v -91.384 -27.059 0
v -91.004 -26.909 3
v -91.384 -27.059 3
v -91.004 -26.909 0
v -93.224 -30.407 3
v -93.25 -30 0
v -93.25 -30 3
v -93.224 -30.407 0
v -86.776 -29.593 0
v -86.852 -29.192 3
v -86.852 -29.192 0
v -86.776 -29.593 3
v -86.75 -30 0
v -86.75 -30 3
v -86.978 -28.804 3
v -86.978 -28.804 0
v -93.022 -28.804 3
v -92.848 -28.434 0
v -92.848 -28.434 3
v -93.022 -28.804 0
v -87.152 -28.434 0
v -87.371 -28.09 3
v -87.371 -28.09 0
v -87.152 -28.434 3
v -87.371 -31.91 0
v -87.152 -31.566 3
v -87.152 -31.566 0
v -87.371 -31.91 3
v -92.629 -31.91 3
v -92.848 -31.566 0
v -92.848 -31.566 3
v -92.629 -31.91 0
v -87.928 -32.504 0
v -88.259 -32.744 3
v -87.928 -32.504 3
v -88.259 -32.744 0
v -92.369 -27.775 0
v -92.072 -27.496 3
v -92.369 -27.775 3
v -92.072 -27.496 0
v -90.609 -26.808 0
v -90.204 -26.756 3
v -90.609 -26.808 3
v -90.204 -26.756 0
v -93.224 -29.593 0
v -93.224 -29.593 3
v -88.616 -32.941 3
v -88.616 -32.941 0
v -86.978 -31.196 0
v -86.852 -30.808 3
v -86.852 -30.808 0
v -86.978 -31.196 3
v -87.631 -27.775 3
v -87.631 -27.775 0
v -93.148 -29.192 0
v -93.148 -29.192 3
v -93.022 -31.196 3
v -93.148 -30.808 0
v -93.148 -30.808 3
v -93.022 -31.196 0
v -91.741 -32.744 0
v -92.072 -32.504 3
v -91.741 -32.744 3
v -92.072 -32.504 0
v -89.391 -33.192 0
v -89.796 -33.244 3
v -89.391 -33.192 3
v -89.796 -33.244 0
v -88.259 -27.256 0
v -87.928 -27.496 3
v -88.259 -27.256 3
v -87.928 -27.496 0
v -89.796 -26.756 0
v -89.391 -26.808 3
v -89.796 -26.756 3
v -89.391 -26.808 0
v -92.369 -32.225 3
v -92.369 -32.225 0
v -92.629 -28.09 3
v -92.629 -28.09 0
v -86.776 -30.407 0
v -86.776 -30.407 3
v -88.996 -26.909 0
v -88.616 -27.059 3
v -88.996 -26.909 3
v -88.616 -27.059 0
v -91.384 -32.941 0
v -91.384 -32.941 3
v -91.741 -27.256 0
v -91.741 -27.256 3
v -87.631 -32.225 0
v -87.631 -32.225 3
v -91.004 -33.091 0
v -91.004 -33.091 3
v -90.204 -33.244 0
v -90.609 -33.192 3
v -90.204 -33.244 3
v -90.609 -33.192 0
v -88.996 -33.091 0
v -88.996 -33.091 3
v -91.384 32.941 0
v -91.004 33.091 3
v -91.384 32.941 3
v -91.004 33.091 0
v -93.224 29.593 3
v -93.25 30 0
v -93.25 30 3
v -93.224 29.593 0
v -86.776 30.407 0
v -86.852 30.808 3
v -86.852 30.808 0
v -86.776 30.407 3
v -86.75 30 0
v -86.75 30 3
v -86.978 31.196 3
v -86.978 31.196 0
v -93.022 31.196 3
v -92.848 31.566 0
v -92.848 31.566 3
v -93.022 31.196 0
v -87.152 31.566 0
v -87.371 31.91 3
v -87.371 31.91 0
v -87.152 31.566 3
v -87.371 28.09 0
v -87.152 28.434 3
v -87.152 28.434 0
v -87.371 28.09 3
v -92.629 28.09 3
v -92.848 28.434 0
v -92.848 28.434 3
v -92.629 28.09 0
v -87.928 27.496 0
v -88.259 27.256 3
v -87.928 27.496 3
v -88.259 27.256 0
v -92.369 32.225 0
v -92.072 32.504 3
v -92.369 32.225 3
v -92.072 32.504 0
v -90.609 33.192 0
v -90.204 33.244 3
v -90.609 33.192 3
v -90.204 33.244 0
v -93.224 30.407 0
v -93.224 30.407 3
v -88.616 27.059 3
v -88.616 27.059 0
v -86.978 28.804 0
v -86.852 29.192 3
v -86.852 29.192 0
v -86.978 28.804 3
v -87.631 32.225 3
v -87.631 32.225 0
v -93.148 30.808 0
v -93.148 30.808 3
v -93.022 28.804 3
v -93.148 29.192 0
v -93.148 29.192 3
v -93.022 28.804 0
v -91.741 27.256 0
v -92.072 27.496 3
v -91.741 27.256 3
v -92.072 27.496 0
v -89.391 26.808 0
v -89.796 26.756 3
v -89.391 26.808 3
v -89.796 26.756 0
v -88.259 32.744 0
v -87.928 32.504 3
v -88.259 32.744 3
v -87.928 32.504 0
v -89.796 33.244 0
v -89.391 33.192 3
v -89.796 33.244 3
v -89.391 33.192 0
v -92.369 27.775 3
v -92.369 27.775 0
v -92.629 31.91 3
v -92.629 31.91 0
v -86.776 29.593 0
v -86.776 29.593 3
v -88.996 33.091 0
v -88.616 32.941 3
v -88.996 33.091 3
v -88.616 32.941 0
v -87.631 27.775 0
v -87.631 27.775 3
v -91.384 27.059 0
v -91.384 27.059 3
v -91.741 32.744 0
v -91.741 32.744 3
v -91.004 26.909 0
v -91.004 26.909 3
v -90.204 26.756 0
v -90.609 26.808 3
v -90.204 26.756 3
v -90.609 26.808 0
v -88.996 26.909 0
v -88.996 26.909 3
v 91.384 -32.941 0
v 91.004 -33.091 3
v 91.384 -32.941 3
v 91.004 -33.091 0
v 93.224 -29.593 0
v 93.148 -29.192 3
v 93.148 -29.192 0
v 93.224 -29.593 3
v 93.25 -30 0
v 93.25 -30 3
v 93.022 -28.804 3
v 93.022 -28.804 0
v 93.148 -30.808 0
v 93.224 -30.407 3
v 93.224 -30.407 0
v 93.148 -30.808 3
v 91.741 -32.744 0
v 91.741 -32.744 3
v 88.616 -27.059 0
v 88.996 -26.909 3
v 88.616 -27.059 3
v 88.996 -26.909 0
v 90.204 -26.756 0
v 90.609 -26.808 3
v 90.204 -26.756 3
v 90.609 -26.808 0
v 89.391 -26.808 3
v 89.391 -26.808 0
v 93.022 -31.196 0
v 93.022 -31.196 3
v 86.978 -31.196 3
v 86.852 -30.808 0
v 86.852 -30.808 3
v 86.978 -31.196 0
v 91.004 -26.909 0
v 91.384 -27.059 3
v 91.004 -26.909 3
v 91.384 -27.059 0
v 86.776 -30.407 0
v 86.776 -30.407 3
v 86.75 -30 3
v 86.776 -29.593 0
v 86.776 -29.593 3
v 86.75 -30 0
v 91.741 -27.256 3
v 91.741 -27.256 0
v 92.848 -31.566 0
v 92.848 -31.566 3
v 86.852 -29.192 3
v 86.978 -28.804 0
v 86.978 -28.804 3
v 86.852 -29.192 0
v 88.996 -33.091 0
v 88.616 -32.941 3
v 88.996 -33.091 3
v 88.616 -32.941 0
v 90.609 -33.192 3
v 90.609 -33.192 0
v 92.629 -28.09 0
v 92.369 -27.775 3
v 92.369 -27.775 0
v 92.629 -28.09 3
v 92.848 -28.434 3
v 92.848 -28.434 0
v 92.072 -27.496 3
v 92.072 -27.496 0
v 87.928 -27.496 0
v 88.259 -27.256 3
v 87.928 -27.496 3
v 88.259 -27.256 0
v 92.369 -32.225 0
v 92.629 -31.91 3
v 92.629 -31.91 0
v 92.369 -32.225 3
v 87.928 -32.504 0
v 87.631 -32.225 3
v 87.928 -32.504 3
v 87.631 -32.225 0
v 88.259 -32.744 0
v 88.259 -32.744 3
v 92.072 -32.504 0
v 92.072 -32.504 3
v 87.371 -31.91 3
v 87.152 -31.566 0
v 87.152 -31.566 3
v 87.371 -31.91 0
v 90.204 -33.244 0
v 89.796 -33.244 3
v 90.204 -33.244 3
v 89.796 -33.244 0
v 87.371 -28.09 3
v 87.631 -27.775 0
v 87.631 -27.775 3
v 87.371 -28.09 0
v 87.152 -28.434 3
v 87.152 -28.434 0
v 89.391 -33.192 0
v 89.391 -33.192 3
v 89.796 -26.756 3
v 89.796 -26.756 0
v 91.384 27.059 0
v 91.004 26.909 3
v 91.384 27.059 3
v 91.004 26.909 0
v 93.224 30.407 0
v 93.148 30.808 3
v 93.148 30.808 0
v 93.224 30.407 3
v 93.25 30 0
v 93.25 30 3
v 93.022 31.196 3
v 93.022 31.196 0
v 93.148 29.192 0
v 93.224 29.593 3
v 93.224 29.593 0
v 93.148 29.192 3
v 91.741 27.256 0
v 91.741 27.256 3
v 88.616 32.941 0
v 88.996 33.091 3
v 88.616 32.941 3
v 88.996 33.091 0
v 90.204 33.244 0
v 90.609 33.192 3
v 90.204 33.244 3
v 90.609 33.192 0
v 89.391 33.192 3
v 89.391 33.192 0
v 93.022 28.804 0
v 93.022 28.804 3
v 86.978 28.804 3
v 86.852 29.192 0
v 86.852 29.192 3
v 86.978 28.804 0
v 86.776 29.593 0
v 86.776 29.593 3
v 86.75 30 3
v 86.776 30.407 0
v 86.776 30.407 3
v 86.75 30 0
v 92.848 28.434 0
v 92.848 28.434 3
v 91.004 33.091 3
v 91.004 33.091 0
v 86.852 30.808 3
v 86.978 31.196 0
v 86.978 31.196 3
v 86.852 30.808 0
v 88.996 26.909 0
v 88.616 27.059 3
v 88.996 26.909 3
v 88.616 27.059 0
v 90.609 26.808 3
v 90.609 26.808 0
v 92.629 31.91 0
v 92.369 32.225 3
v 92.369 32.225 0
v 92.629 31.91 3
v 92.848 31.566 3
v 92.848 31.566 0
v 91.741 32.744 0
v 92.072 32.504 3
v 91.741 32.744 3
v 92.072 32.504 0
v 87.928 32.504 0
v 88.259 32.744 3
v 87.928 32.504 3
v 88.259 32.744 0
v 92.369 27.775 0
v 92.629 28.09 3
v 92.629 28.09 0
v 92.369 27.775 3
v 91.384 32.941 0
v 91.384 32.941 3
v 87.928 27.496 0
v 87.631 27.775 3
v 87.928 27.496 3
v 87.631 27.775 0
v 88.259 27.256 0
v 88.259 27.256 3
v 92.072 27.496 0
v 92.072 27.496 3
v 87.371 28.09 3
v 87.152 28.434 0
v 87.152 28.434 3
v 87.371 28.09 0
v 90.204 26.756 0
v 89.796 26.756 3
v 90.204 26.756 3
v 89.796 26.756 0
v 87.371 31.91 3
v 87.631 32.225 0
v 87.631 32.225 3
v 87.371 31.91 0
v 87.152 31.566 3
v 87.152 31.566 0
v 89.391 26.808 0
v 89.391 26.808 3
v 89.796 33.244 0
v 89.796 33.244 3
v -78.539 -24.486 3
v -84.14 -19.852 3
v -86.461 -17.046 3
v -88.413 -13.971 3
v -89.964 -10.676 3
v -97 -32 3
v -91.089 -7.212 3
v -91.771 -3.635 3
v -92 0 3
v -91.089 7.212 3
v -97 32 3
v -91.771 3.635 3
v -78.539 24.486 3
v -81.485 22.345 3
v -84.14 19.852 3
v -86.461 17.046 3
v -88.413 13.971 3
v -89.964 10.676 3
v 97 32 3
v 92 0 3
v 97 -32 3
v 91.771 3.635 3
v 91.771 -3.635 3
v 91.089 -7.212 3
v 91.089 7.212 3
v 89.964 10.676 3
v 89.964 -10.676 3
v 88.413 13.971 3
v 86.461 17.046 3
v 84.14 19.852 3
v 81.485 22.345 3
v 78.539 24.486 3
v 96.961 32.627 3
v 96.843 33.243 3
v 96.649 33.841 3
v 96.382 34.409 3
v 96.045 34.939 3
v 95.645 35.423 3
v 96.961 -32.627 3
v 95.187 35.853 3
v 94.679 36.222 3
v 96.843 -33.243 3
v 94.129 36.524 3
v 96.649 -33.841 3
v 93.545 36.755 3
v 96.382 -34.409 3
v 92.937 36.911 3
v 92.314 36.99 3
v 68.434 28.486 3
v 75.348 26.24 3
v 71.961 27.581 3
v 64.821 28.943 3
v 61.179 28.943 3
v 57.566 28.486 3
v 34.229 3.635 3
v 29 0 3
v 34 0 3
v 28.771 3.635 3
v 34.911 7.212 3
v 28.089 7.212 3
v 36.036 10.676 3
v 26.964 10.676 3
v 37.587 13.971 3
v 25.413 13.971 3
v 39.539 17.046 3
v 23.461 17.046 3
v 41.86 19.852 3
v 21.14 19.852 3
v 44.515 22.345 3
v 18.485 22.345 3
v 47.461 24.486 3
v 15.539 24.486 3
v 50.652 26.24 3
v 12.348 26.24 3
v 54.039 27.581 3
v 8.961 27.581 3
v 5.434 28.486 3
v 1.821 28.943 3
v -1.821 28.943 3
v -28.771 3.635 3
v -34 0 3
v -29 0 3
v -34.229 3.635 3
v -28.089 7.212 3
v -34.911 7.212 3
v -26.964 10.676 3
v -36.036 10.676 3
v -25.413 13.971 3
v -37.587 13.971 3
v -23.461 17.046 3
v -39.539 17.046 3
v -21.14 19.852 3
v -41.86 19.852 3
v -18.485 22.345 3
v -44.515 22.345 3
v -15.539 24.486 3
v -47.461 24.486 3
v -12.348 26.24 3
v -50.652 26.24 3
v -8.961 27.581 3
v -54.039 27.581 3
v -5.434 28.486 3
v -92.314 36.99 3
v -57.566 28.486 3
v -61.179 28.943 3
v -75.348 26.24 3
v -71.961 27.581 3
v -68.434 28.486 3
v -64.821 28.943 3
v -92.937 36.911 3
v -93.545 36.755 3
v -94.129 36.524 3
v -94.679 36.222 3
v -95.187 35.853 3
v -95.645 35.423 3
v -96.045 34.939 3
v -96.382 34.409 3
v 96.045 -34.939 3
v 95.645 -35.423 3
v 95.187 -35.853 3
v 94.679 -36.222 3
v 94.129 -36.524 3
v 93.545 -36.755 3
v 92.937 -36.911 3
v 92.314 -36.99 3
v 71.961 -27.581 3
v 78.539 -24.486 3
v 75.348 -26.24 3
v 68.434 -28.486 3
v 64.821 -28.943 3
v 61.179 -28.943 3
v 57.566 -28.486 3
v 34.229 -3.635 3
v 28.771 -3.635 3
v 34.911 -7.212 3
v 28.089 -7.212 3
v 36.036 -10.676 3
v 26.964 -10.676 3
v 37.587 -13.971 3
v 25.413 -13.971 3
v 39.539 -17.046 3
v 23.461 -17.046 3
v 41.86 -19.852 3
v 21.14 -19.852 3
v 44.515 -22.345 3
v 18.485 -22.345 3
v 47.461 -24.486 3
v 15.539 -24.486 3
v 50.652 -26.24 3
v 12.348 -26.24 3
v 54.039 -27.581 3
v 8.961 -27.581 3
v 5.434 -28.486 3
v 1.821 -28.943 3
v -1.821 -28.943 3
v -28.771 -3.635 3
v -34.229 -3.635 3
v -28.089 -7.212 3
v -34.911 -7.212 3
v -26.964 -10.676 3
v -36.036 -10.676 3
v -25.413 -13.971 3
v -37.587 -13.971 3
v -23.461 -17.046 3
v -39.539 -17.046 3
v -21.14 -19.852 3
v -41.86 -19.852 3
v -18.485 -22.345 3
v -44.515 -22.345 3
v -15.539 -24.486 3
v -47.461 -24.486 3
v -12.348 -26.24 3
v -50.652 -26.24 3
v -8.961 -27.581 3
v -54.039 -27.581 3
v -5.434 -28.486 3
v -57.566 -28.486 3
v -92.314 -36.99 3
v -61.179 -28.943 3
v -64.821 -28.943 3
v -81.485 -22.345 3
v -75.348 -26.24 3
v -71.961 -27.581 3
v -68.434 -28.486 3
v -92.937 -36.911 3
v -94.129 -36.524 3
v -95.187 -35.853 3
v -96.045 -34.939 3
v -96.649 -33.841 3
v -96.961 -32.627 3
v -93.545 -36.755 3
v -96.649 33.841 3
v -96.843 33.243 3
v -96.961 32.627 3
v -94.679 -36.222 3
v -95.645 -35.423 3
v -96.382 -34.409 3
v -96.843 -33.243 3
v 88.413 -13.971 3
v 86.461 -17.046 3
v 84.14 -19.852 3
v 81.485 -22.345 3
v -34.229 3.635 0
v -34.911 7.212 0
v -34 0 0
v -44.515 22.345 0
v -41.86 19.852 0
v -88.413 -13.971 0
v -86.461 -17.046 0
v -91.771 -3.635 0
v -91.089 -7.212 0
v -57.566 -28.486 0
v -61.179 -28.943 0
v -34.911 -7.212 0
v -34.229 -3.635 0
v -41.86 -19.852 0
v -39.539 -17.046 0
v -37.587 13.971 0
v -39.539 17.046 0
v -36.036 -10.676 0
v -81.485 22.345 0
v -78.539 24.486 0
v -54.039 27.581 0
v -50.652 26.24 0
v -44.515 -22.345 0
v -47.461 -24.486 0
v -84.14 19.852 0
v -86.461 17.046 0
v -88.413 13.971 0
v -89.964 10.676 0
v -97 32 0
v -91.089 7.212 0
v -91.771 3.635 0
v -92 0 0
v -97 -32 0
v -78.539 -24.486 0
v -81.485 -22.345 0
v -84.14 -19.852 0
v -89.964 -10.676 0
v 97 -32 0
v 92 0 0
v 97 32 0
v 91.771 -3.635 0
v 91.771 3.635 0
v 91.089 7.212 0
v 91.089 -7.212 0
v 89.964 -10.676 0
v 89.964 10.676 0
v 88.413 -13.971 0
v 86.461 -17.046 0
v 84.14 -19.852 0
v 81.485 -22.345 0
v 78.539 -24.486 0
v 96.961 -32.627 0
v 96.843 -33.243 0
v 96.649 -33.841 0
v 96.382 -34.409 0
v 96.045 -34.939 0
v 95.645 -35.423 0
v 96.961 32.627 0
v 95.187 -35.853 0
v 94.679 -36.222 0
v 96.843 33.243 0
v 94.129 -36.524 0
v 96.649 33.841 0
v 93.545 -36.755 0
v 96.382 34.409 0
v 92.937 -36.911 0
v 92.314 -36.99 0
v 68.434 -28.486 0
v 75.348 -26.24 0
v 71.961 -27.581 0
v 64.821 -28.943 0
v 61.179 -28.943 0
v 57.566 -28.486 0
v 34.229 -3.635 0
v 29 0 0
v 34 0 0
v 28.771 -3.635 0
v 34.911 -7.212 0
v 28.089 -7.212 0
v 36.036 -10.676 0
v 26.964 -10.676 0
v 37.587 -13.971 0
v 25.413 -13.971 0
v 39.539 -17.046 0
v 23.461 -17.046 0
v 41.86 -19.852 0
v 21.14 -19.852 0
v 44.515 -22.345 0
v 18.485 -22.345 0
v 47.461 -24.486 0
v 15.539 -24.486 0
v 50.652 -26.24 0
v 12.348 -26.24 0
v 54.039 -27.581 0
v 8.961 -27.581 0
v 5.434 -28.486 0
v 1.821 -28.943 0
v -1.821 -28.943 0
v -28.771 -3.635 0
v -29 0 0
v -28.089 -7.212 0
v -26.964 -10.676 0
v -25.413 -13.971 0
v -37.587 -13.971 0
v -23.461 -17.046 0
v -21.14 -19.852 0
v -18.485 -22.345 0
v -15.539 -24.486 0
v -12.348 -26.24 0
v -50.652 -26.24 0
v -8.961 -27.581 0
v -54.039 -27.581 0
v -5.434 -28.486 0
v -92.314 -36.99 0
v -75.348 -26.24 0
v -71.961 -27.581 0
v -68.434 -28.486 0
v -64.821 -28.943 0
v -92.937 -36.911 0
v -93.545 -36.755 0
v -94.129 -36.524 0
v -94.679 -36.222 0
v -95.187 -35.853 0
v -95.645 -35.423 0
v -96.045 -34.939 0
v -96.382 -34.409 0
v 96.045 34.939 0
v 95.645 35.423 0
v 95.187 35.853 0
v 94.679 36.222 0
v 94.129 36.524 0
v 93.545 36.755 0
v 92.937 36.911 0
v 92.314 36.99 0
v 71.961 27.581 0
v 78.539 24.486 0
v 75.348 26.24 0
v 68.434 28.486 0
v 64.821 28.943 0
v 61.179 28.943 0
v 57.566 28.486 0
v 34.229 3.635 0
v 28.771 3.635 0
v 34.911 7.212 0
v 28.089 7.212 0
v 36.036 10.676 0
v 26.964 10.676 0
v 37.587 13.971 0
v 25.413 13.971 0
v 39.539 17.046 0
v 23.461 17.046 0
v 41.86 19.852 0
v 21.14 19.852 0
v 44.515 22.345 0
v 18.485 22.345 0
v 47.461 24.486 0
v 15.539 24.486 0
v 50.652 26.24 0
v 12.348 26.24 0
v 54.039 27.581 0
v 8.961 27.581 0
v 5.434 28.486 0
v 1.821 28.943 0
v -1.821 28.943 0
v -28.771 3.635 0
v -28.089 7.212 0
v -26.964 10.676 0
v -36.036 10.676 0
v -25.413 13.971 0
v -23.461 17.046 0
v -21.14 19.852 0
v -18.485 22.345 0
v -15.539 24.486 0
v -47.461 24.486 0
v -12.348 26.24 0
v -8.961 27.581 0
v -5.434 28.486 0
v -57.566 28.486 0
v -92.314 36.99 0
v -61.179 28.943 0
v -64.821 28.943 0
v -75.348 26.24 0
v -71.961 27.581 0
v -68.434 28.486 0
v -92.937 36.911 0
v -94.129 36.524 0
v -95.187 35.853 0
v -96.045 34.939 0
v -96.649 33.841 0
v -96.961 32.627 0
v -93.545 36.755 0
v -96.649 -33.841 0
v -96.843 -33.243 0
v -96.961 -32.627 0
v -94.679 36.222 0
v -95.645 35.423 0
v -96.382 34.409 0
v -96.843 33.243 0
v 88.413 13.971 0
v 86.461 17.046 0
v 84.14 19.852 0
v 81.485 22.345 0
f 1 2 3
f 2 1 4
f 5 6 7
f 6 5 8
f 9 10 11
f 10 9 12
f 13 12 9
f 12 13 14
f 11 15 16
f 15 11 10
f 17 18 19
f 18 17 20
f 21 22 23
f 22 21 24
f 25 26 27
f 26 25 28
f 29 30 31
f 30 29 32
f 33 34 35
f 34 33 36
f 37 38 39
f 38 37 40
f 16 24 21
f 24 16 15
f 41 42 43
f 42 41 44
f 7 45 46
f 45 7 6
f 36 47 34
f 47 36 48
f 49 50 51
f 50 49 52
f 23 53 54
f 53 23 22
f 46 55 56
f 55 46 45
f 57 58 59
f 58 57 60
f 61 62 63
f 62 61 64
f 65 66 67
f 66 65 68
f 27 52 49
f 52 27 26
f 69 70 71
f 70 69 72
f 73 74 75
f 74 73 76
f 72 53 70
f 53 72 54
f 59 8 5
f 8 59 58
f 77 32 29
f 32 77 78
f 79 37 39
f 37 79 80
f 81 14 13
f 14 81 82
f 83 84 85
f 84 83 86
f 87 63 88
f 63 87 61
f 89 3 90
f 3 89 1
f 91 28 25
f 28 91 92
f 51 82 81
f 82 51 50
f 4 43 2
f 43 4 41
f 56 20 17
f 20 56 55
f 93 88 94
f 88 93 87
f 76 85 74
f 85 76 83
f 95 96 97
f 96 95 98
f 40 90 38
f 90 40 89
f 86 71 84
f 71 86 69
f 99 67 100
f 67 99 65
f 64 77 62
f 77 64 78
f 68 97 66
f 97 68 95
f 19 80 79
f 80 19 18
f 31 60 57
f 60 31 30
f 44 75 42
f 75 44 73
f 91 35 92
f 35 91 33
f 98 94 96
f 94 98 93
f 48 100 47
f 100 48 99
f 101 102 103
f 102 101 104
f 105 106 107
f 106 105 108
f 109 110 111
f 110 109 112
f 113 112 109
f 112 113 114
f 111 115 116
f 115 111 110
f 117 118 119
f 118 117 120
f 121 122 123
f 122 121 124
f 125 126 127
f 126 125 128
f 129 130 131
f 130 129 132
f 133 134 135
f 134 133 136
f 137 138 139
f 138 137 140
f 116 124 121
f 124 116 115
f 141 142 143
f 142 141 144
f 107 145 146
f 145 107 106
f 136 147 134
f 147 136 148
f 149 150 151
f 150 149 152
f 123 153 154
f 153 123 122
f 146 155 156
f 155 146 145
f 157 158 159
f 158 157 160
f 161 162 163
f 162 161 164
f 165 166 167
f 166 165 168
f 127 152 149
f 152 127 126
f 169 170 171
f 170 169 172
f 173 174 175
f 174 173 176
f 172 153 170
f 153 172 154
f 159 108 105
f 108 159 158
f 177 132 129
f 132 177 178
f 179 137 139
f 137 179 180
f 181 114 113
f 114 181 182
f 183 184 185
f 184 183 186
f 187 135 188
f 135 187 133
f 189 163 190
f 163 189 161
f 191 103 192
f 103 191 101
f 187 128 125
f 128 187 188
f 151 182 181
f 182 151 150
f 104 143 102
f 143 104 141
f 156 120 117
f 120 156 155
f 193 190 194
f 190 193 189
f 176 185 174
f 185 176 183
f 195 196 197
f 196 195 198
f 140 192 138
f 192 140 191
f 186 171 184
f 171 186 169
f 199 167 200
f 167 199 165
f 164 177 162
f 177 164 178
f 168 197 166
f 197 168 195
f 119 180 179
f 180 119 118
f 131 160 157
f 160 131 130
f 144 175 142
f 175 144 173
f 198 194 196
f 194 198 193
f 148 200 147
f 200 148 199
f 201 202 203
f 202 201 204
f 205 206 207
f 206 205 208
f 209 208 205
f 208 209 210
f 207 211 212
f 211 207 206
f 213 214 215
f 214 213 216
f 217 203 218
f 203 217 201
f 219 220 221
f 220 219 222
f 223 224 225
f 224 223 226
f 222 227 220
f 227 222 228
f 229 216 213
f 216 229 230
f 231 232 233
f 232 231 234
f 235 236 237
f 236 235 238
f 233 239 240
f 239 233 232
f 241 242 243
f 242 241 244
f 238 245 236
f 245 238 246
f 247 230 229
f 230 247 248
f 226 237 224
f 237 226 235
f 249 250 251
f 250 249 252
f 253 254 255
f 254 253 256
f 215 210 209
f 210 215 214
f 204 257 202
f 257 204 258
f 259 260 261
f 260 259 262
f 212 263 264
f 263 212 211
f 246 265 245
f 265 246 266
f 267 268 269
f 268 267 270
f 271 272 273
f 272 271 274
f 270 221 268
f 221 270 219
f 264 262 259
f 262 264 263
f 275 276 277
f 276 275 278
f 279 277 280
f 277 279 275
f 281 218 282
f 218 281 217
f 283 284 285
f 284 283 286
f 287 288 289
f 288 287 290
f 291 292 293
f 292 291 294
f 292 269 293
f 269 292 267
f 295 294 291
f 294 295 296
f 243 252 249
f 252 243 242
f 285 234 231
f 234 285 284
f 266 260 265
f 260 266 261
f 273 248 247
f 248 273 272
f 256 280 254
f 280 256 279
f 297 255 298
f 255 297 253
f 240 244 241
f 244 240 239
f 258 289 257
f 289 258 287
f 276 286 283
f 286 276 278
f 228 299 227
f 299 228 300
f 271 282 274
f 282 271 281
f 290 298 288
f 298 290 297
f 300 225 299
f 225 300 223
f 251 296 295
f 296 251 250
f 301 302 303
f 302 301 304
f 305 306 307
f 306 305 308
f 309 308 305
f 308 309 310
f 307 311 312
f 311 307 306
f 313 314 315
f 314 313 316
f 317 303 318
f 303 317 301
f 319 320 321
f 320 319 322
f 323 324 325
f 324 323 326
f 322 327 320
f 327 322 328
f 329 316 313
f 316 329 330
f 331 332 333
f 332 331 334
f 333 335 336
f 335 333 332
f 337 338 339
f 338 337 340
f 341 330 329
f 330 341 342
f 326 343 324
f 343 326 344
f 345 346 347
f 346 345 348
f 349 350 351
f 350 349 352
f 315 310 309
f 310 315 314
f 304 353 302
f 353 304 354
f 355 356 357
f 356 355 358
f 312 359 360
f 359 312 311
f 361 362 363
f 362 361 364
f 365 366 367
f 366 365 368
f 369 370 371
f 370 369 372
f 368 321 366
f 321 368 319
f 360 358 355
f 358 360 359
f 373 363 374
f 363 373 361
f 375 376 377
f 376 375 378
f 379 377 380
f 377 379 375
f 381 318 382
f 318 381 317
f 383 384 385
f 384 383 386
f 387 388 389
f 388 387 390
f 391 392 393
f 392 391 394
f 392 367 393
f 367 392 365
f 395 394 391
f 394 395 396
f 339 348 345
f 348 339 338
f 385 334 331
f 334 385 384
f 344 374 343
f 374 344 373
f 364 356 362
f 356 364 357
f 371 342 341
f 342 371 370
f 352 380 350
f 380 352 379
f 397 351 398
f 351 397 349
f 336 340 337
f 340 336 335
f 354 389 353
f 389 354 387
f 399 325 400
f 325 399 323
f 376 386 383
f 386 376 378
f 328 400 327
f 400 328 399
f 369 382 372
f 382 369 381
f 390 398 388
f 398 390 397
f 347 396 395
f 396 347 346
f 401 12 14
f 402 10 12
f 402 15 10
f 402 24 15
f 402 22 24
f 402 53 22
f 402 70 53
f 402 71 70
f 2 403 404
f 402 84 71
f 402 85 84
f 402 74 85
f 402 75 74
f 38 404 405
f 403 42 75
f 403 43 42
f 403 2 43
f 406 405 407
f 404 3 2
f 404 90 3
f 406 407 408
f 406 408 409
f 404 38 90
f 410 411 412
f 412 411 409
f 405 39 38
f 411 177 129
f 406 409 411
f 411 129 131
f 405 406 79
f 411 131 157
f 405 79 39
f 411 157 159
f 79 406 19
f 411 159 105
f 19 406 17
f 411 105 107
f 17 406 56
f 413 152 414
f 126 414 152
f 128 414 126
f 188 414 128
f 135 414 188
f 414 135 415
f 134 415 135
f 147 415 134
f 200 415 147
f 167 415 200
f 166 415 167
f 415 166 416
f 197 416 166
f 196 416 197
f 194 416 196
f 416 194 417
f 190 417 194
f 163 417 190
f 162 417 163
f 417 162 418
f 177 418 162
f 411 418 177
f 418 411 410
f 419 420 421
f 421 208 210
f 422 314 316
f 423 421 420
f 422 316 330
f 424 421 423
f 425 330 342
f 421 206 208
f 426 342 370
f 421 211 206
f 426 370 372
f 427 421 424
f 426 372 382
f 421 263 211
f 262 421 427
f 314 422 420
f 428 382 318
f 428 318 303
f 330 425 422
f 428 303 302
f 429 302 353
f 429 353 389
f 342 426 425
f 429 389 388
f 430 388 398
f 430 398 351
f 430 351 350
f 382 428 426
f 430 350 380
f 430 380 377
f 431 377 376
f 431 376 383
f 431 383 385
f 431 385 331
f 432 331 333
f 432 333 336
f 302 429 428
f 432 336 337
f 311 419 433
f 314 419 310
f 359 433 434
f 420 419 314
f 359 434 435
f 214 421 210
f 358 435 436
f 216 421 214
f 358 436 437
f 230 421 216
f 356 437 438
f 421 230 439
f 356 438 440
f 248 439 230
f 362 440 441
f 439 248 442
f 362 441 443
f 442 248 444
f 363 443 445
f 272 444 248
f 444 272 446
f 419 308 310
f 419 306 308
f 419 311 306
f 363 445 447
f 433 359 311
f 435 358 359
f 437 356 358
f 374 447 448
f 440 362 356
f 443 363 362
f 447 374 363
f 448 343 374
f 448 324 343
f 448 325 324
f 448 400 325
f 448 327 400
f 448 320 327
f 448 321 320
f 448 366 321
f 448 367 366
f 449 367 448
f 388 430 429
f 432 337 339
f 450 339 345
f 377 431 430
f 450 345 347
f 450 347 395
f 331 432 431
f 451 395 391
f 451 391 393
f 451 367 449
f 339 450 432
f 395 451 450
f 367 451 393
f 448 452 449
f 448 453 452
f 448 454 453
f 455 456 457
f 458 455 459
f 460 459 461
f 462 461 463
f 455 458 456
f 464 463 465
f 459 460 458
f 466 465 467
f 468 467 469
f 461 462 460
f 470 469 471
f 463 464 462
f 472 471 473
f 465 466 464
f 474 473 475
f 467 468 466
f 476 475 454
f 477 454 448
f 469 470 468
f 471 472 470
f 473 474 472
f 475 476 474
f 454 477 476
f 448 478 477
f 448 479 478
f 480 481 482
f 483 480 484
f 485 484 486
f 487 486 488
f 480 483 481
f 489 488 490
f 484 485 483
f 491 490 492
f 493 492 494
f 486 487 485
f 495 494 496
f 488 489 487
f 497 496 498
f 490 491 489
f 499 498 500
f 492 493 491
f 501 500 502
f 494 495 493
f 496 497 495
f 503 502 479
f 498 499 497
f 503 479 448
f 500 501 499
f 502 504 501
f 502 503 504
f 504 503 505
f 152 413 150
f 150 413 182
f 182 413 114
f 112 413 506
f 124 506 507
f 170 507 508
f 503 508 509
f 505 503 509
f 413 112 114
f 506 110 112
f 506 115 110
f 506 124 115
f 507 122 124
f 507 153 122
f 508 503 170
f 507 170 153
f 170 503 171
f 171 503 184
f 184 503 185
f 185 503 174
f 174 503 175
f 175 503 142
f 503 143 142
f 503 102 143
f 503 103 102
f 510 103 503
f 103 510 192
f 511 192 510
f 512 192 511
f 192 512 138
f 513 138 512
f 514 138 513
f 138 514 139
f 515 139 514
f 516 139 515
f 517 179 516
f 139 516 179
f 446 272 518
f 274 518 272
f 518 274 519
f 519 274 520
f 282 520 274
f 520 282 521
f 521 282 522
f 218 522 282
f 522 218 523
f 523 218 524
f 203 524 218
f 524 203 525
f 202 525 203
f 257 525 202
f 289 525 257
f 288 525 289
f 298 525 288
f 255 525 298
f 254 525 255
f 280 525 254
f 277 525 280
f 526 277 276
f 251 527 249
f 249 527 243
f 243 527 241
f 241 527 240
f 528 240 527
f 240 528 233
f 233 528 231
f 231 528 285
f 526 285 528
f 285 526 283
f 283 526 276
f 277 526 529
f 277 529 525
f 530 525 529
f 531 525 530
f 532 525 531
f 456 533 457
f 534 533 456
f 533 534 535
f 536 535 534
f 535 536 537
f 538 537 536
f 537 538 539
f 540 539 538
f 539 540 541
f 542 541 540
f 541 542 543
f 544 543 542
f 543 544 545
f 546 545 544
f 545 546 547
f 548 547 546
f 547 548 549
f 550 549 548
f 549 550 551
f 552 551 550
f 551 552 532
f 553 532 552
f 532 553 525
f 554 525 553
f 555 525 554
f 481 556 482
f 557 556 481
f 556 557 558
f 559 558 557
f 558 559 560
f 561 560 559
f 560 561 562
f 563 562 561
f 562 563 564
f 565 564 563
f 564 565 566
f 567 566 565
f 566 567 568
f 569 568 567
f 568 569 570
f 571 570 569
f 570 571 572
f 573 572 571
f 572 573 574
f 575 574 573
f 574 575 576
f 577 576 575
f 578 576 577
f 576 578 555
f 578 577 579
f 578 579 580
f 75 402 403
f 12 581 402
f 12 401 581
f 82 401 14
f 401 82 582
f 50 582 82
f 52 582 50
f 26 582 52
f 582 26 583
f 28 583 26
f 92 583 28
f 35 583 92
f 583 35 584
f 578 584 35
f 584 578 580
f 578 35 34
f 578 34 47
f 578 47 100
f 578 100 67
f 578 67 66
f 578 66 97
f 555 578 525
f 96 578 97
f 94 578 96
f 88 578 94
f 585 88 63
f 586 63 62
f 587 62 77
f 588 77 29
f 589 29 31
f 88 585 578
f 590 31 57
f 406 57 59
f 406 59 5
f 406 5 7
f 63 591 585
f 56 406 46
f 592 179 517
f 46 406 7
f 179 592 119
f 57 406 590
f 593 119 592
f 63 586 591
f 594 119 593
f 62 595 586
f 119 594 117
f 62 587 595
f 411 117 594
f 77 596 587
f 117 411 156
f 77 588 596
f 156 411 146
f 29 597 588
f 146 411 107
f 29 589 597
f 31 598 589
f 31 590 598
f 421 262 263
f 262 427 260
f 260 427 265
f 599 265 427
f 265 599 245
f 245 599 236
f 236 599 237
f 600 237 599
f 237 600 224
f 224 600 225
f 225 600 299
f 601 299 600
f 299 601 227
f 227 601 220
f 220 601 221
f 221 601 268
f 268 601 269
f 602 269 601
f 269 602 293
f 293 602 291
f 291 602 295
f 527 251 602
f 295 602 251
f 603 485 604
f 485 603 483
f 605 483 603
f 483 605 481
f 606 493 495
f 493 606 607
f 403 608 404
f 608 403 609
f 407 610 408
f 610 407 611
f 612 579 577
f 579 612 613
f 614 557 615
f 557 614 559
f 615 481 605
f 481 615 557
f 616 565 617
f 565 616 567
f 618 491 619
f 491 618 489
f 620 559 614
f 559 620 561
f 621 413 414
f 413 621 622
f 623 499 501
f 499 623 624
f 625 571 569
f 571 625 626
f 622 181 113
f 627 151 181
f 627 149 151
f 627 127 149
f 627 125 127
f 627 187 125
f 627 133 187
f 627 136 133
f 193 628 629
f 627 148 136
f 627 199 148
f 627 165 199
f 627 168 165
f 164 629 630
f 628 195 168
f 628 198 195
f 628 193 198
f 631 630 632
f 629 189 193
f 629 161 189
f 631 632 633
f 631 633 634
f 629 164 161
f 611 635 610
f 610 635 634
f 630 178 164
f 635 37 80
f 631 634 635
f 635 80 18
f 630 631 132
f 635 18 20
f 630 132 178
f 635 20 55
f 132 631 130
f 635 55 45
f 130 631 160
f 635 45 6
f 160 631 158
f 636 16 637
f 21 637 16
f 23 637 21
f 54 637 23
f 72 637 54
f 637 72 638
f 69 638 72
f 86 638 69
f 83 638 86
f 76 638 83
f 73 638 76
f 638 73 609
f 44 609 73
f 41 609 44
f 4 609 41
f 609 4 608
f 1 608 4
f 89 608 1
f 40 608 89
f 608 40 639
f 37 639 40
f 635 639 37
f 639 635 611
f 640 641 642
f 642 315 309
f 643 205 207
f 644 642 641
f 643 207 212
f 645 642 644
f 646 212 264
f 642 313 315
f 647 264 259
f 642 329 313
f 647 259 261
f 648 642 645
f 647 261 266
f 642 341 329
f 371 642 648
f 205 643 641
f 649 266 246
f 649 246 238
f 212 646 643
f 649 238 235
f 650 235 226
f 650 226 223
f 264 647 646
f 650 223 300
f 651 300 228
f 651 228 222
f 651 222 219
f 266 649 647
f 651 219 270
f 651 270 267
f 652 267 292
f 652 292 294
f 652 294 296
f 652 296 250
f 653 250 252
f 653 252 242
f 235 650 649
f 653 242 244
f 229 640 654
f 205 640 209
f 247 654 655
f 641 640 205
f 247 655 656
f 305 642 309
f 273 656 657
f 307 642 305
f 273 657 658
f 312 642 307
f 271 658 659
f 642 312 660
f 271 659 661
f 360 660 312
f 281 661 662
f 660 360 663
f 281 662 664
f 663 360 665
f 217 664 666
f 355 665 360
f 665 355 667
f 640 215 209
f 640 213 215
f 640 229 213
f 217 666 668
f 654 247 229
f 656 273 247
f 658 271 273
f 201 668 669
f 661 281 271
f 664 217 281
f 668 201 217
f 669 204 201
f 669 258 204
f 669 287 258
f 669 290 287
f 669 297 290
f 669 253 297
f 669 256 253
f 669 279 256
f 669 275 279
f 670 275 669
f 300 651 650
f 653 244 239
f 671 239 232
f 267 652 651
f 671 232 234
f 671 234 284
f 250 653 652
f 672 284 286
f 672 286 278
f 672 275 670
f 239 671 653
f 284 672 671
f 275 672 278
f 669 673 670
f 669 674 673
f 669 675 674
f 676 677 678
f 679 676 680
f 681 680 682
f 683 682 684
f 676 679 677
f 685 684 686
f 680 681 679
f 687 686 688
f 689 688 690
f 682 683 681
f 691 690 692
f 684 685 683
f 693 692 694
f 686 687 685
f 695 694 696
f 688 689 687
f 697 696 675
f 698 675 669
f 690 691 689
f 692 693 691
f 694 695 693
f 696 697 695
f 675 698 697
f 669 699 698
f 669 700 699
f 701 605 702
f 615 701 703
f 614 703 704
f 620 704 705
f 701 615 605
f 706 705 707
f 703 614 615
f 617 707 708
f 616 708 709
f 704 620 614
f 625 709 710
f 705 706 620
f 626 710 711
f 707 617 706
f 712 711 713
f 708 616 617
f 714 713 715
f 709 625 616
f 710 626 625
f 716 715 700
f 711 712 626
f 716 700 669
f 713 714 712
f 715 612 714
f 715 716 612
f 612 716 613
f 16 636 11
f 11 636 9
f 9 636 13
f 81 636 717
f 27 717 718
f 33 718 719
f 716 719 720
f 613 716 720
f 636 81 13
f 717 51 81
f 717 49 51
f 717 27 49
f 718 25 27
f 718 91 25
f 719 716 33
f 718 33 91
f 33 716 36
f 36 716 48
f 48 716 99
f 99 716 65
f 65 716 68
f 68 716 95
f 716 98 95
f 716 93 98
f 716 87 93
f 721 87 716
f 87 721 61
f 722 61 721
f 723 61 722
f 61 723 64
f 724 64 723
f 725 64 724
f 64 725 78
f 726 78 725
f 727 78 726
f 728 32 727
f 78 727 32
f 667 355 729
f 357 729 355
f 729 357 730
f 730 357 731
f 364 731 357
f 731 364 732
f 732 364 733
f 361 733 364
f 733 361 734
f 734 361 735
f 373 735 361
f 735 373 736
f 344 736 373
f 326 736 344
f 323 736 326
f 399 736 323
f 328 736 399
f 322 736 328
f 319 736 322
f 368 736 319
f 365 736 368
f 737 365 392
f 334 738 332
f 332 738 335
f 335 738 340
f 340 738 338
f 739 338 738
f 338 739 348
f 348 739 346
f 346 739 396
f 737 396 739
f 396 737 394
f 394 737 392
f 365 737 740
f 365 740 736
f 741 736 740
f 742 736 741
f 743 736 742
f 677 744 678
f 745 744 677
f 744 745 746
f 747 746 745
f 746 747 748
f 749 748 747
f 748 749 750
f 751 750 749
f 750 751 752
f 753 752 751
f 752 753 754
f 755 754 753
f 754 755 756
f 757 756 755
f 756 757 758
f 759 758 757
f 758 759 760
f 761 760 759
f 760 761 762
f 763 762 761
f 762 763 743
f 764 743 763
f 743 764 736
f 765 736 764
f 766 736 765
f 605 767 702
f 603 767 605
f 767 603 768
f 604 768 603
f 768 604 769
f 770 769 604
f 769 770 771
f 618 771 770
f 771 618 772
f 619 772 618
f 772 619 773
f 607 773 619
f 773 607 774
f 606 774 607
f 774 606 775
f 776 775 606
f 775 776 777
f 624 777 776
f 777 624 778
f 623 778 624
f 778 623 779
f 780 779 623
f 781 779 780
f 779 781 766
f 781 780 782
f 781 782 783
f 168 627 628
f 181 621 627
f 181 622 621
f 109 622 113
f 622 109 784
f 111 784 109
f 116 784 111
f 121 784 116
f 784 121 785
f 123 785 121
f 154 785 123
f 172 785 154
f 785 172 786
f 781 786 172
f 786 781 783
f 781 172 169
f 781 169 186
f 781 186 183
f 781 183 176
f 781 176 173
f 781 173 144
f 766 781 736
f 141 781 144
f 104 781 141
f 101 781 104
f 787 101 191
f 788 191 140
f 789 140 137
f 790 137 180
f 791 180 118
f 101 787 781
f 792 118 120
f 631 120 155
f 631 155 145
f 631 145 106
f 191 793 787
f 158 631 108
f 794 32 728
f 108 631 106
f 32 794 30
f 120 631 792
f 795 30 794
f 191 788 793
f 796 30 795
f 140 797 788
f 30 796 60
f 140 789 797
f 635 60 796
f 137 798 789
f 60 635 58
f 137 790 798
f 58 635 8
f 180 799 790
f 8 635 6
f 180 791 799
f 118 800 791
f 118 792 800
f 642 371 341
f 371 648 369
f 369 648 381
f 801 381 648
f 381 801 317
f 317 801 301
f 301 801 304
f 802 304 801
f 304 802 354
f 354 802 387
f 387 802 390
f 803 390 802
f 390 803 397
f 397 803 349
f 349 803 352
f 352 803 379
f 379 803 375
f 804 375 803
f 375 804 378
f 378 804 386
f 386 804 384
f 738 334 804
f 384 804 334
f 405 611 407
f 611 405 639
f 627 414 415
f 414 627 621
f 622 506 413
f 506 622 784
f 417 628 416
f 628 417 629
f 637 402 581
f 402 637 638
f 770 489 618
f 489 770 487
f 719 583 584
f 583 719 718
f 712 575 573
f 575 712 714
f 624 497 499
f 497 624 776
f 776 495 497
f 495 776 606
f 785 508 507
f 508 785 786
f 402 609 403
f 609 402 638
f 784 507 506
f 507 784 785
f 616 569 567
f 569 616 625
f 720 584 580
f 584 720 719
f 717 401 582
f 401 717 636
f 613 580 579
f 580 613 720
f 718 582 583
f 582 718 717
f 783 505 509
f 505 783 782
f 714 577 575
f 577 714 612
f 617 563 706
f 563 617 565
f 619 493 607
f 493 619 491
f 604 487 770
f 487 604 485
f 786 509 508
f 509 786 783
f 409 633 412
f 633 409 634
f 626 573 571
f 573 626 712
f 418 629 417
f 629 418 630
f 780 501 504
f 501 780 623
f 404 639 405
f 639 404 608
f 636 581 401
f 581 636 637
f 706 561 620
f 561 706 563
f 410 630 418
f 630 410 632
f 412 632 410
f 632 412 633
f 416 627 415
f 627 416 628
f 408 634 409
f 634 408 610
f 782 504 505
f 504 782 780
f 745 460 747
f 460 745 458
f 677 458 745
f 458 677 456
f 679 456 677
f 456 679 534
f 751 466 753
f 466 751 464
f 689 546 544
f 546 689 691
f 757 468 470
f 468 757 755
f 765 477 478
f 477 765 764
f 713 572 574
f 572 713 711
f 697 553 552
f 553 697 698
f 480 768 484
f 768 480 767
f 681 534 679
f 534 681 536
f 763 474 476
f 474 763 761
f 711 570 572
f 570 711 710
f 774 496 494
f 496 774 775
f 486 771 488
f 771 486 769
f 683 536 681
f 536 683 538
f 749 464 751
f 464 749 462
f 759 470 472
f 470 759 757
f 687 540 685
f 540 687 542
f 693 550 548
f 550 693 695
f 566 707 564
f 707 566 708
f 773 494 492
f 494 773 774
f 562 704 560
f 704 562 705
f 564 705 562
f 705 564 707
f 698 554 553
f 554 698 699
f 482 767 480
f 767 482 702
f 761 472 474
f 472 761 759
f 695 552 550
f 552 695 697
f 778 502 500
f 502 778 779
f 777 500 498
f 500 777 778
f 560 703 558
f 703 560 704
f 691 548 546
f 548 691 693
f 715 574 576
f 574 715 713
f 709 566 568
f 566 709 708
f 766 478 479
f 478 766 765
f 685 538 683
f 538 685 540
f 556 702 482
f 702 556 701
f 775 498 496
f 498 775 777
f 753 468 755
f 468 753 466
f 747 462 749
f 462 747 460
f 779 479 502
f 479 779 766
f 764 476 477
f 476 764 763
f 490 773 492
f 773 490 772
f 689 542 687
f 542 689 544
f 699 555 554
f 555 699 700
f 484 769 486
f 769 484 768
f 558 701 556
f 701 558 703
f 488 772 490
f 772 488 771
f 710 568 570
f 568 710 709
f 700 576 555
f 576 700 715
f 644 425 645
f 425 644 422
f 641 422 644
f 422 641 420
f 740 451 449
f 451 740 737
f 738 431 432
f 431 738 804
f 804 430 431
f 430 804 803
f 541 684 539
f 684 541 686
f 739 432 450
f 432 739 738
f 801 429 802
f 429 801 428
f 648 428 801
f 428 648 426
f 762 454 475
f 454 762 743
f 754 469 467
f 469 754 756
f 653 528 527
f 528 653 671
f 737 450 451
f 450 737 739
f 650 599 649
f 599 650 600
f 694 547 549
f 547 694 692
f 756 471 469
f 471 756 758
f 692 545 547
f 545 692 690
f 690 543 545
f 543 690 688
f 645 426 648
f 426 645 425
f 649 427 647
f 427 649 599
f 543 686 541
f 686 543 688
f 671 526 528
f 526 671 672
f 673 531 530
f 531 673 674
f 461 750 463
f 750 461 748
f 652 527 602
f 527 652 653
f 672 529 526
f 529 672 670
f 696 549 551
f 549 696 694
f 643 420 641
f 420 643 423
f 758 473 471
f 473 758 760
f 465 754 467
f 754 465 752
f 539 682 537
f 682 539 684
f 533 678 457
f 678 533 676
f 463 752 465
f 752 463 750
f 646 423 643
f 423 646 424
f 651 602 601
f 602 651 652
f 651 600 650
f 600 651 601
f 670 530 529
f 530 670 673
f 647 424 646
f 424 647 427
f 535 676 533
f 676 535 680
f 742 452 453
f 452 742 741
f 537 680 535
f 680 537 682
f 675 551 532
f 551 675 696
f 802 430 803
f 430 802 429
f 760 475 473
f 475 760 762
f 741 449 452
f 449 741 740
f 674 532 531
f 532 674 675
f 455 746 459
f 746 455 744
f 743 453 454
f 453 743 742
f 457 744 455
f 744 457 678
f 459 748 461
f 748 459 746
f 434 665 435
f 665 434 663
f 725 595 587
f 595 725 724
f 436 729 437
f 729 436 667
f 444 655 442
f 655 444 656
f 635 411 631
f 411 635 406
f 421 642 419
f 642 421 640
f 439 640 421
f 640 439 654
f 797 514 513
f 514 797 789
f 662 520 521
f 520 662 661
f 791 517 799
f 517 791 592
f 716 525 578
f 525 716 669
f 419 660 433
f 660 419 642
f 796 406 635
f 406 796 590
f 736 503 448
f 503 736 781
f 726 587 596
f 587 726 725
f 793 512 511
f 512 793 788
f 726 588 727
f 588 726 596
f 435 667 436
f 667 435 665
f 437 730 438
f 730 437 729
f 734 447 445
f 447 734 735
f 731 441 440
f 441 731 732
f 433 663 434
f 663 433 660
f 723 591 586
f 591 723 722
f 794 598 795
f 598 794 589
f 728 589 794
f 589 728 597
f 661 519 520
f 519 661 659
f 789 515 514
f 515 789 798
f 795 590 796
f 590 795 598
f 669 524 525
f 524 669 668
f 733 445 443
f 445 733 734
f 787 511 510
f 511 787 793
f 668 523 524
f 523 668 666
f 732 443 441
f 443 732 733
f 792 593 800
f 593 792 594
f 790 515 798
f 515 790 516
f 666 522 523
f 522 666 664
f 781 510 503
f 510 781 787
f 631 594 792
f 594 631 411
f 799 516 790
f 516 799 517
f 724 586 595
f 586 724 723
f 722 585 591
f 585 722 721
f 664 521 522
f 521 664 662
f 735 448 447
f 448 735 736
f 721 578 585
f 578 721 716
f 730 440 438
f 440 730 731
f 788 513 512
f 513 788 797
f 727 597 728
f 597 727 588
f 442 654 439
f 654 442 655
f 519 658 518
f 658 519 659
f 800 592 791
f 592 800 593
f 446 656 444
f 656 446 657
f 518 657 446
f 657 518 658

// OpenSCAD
$fn = 50;


difference() {
	union() {
		hull() {
			translate(v = [-92.0000000000, 32.0000000000, 0]) {
				cylinder(h = 3, r = 5);
			}
			translate(v = [92.0000000000, 32.0000000000, 0]) {
				cylinder(h = 3, r = 5);
			}
			translate(v = [-92.0000000000, -32.0000000000, 0]) {
				cylinder(h = 3, r = 5);
			}
			translate(v = [92.0000000000, -32.0000000000, 0]) {
				cylinder(h = 3, r = 5);
			}
		}
	}
	union() {
		#translate(v = [-90.0000000000, -30.0000000000, -100.0000000000]) {
			cylinder(h = 200, r = 3.2500000000);
		}
		#translate(v = [-90.0000000000, 30.0000000000, -100.0000000000]) {
			cylinder(h = 200, r = 3.2500000000);
		}
		#translate(v = [90.0000000000, -30.0000000000, -100.0000000000]) {
			cylinder(h = 200, r = 3.2500000000);
		}
		#translate(v = [90.0000000000, 30.0000000000, -100.0000000000]) {
			cylinder(h = 200, r = 3.2500000000);
		}
		#translate(v = [-63.0000000000, 0, 0]) {
			cylinder(h = 3, r = 29.0000000000);
		}
		#cylinder(h = 3, r = 29.0000000000);
		#translate(v = [63.0000000000, 0, 0]) {
			cylinder(h = 3, r = 29.0000000000);
		}
	}
}
